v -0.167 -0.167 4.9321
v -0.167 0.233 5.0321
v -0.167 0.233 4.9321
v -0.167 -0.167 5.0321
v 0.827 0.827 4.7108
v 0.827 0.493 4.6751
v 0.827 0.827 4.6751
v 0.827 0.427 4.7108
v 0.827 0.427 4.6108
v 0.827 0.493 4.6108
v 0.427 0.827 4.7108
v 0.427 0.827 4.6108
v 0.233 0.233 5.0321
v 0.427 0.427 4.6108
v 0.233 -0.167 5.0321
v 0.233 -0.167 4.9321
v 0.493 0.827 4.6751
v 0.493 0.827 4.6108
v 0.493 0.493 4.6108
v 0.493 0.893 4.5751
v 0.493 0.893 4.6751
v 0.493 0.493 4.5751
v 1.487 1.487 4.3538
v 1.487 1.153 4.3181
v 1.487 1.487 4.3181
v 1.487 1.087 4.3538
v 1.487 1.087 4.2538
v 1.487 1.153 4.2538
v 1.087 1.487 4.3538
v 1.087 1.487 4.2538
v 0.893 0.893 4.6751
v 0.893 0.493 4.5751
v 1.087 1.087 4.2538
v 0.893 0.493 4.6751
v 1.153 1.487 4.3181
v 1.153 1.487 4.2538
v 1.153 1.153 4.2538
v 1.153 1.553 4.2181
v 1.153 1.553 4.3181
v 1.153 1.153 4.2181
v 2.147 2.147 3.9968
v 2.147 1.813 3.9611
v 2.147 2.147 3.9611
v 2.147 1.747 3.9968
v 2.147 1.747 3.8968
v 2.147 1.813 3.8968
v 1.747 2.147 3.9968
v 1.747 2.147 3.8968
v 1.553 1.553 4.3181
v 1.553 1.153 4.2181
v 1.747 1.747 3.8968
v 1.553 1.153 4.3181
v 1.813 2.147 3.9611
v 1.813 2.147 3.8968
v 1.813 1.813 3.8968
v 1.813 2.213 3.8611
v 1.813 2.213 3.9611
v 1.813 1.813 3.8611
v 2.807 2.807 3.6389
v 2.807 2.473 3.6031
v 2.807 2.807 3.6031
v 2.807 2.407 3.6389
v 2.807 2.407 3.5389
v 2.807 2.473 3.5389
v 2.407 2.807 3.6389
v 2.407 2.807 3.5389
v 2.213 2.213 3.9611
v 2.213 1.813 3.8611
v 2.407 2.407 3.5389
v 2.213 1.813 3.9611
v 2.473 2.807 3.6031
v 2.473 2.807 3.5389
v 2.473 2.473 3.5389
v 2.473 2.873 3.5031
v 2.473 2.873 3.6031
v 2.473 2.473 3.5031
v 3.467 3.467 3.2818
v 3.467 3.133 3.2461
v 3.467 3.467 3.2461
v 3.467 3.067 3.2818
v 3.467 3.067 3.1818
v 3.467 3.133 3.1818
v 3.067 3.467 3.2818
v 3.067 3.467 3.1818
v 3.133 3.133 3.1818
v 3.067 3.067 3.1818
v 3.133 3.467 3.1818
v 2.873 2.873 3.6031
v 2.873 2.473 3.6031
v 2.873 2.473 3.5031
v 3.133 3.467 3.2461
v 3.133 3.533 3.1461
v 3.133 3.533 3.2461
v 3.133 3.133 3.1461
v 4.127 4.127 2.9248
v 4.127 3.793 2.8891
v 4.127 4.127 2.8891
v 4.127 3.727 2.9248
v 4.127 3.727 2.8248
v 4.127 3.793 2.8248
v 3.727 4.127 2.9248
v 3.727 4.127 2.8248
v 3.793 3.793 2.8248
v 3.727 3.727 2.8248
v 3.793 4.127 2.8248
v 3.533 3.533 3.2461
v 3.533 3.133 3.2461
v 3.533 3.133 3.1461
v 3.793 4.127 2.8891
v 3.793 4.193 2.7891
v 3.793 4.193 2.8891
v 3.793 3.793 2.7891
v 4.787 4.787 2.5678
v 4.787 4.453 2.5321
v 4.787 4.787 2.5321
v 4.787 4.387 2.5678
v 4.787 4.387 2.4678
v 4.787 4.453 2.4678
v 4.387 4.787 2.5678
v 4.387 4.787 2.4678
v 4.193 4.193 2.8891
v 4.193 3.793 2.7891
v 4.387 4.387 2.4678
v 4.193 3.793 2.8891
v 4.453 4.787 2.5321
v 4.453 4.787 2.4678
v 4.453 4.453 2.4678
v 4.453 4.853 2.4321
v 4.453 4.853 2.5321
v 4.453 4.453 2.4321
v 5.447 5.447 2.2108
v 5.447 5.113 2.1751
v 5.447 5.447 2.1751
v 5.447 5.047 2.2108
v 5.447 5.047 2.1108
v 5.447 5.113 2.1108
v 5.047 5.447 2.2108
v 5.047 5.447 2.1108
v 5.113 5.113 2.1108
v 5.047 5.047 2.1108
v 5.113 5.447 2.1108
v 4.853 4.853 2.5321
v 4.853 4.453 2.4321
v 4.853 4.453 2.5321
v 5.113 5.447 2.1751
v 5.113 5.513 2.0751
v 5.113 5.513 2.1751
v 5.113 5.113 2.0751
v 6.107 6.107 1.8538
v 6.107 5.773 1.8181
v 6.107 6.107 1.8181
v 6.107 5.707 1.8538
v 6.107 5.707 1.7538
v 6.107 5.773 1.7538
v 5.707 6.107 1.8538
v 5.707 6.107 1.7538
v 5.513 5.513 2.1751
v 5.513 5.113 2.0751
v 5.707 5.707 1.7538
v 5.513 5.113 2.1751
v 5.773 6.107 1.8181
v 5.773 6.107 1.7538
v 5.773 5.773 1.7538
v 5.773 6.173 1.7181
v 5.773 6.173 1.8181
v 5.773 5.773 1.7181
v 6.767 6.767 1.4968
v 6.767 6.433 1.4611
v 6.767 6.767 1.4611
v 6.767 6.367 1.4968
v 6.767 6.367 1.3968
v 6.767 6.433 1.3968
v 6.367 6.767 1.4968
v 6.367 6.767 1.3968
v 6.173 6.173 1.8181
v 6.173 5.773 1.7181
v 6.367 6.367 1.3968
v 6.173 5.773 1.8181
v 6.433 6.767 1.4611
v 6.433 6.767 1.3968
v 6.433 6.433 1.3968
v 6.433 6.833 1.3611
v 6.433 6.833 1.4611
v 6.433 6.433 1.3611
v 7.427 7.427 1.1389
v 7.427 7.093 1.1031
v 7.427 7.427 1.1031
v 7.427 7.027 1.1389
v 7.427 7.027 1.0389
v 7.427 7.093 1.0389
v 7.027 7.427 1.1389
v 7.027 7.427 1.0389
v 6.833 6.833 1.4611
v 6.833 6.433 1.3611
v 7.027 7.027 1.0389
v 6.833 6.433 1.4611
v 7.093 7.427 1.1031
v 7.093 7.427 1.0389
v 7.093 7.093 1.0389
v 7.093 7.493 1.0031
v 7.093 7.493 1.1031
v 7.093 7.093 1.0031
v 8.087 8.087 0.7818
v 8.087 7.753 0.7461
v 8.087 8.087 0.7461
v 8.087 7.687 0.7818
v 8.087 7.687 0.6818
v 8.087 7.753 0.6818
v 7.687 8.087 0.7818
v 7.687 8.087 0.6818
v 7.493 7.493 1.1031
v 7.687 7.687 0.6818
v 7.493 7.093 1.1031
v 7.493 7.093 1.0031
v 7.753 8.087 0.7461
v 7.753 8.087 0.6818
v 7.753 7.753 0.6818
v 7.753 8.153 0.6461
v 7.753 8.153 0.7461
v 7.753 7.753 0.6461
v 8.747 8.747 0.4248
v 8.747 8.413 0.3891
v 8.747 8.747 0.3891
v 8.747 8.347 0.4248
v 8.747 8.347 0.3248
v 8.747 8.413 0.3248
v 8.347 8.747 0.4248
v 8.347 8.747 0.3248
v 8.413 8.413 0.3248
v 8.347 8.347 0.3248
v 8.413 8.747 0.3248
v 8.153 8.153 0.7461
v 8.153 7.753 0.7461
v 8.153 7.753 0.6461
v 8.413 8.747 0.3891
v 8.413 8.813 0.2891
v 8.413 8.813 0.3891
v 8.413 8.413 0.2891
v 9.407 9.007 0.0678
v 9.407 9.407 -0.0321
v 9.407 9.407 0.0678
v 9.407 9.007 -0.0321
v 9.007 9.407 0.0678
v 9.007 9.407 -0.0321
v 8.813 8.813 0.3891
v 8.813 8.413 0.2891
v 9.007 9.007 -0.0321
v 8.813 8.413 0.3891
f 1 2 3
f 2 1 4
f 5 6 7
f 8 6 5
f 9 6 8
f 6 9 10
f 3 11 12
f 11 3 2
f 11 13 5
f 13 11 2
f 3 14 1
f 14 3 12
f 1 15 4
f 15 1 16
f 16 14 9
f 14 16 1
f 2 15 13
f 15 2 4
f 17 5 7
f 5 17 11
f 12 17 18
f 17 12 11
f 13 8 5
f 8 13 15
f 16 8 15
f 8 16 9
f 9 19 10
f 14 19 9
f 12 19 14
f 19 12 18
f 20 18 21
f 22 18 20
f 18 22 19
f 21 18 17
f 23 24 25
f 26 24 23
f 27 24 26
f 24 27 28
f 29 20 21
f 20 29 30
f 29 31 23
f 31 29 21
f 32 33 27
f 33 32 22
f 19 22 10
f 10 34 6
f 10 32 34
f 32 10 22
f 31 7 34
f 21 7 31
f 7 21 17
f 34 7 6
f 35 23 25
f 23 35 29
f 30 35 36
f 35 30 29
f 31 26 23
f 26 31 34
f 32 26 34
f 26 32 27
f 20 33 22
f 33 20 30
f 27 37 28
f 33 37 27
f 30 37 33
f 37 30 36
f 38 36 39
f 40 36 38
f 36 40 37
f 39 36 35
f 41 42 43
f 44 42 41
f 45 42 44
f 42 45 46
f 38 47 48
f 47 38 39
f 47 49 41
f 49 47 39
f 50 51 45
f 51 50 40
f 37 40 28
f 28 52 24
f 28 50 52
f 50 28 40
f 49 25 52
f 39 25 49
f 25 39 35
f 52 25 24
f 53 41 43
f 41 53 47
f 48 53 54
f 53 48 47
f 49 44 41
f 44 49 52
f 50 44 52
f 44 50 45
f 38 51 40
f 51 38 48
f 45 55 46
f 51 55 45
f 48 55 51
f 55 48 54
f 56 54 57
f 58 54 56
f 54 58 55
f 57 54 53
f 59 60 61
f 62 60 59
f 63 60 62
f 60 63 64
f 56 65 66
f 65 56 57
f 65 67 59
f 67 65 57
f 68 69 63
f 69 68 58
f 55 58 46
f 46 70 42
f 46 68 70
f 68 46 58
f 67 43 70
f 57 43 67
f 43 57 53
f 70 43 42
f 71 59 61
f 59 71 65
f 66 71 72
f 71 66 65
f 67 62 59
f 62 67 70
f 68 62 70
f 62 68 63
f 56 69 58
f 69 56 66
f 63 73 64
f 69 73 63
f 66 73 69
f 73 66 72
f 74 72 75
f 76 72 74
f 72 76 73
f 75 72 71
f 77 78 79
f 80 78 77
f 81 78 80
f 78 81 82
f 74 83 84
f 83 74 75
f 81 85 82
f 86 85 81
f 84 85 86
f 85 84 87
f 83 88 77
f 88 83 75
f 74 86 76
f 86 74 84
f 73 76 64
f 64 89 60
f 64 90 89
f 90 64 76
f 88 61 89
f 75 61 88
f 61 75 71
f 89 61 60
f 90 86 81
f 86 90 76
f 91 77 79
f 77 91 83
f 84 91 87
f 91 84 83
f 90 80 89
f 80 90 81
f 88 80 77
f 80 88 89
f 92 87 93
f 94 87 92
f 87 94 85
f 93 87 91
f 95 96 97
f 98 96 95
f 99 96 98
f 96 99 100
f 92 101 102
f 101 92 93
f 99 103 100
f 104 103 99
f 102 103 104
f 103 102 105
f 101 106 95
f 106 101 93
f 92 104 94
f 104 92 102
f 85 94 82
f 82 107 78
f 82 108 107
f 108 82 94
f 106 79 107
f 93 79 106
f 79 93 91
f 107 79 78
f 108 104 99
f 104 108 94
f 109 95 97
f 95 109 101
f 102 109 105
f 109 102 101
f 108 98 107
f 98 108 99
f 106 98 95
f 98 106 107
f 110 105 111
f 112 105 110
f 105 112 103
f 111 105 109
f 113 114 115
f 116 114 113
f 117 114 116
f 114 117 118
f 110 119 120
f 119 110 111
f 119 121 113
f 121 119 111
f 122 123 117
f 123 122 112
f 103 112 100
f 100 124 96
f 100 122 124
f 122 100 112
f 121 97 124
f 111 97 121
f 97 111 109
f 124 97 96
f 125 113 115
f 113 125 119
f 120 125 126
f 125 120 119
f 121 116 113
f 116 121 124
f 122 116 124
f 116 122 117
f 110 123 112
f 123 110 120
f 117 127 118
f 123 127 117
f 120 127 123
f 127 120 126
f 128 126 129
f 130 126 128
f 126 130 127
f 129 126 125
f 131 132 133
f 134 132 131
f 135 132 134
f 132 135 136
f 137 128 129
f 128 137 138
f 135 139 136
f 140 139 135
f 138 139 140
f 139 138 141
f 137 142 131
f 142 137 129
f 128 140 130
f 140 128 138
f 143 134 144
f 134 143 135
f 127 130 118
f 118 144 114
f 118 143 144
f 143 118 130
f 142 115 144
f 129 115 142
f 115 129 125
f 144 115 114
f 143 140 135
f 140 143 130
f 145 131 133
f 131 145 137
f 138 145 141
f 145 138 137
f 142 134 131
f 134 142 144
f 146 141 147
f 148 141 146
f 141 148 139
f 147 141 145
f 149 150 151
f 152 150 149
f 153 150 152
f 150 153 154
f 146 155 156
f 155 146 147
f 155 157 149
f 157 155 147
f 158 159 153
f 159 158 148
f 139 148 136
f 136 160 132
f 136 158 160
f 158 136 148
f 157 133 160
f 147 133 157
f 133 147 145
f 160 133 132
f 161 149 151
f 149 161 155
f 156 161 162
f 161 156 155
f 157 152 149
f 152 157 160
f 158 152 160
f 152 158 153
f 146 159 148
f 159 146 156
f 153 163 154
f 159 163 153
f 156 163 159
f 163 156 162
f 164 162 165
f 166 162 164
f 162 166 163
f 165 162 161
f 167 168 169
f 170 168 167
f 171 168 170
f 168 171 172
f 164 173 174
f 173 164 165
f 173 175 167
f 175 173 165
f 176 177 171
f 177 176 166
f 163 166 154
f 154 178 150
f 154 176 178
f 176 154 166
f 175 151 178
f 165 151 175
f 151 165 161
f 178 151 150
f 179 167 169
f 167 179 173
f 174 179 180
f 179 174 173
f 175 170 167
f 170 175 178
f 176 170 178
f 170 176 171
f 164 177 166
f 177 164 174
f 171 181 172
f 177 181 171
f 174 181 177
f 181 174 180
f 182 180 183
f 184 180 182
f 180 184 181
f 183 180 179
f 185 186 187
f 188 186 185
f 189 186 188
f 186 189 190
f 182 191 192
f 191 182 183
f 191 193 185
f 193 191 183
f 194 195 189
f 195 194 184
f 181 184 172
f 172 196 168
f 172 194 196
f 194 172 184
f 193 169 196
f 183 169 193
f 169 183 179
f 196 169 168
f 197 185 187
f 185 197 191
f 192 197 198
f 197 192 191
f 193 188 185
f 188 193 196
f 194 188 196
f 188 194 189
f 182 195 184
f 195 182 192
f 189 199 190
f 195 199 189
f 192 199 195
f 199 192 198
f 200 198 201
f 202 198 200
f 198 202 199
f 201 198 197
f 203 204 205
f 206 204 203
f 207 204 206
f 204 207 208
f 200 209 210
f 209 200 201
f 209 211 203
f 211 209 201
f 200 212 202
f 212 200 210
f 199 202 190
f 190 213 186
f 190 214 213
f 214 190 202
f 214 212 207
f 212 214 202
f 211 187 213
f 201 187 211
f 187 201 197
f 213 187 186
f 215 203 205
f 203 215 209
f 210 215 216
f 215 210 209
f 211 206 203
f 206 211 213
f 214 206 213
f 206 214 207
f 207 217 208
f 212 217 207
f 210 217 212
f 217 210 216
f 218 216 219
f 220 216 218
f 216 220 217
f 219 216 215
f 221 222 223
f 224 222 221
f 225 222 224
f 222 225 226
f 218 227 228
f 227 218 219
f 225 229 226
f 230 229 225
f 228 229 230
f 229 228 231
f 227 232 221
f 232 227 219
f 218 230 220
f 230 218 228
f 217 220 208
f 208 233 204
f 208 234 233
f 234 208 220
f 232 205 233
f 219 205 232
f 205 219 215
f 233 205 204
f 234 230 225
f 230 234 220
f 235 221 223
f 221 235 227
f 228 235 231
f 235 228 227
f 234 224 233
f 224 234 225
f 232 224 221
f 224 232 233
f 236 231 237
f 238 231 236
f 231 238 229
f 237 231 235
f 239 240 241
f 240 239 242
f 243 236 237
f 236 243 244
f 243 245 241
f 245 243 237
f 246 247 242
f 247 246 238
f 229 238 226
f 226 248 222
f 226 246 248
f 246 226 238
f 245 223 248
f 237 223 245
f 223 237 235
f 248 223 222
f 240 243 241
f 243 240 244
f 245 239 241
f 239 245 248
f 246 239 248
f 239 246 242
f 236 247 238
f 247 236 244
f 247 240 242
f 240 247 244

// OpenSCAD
hull() {
    translate([0.033, 0.033, 4.98215]) cube([0.4, 0.4, 0.1], center=true);
    translate([0.6270000000000001, 0.6270000000000001, 4.66085]) cube([0.4, 0.4, 0.1], center=true);
}


hull() {
    translate([0.6930000000000001, 0.6930000000000001, 4.62515]) cube([0.4, 0.4, 0.1], center=true);
    translate([1.2870000000000001, 1.2870000000000001, 4.30385]) cube([0.4, 0.4, 0.1], center=true);
}


hull() {
    translate([1.3530000000000002, 1.3530000000000002, 4.2681499999999994]) cube([0.4, 0.4, 0.1], center=true);
    translate([1.947, 1.947, 3.94685]) cube([0.4, 0.4, 0.1], center=true);
}


hull() {
    translate([2.013, 2.013, 3.9111]) cube([0.4, 0.4, 0.1], center=true);
    translate([2.607, 2.607, 3.5889]) cube([0.4, 0.4, 0.1], center=true);
}


hull() {
    translate([2.6730000000000005, 2.6730000000000005, 3.5531500000000005]) cube([0.4, 0.4, 0.1], center=true);
    translate([3.267, 3.267, 3.2318499999999997]) cube([0.4, 0.4, 0.1], center=true);
}


hull() {
    translate([3.3329999999999997, 3.3329999999999997, 3.19615]) cube([0.4, 0.4, 0.1], center=true);
    translate([3.927, 3.927, 2.8748500000000003]) cube([0.4, 0.4, 0.1], center=true);
}


hull() {
    translate([3.9930000000000003, 3.9930000000000003, 2.8391500000000005]) cube([0.4, 0.4, 0.1], center=true);
    translate([4.587000000000001, 4.587000000000001, 2.51785]) cube([0.4, 0.4, 0.1], center=true);
}


hull() {
    translate([4.6530000000000005, 4.6530000000000005, 2.48215]) cube([0.4, 0.4, 0.1], center=true);
    translate([5.247000000000001, 5.247000000000001, 2.16085]) cube([0.4, 0.4, 0.1], center=true);
}


hull() {
    translate([5.313000000000001, 5.313000000000001, 2.1251499999999997]) cube([0.4, 0.4, 0.1], center=true);
    translate([5.907, 5.907, 1.8038500000000002]) cube([0.4, 0.4, 0.1], center=true);
}


hull() {
    translate([5.973, 5.973, 1.76815]) cube([0.4, 0.4, 0.1], center=true);
    translate([6.566999999999999, 6.566999999999999, 1.44685]) cube([0.4, 0.4, 0.1], center=true);
}


hull() {
    translate([6.632999999999999, 6.632999999999999, 1.4111]) cube([0.4, 0.4, 0.1], center=true);
    translate([7.227, 7.227, 1.0889]) cube([0.4, 0.4, 0.1], center=true);
}


hull() {
    translate([7.293, 7.293, 1.05315]) cube([0.4, 0.4, 0.1], center=true);
    translate([7.8870000000000005, 7.8870000000000005, 0.7318499999999999]) cube([0.4, 0.4, 0.1], center=true);
}


hull() {
    translate([7.953, 7.953, 0.6961499999999999]) cube([0.4, 0.4, 0.1], center=true);
    translate([8.547, 8.547, 0.37484999999999996]) cube([0.4, 0.4, 0.1], center=true);
}


hull() {
    translate([8.613, 8.613, 0.33914999999999995]) cube([0.4, 0.4, 0.1], center=true);
    translate([9.207, 9.207, 0.01785]) cube([0.4, 0.4, 0.1], center=true);
}
